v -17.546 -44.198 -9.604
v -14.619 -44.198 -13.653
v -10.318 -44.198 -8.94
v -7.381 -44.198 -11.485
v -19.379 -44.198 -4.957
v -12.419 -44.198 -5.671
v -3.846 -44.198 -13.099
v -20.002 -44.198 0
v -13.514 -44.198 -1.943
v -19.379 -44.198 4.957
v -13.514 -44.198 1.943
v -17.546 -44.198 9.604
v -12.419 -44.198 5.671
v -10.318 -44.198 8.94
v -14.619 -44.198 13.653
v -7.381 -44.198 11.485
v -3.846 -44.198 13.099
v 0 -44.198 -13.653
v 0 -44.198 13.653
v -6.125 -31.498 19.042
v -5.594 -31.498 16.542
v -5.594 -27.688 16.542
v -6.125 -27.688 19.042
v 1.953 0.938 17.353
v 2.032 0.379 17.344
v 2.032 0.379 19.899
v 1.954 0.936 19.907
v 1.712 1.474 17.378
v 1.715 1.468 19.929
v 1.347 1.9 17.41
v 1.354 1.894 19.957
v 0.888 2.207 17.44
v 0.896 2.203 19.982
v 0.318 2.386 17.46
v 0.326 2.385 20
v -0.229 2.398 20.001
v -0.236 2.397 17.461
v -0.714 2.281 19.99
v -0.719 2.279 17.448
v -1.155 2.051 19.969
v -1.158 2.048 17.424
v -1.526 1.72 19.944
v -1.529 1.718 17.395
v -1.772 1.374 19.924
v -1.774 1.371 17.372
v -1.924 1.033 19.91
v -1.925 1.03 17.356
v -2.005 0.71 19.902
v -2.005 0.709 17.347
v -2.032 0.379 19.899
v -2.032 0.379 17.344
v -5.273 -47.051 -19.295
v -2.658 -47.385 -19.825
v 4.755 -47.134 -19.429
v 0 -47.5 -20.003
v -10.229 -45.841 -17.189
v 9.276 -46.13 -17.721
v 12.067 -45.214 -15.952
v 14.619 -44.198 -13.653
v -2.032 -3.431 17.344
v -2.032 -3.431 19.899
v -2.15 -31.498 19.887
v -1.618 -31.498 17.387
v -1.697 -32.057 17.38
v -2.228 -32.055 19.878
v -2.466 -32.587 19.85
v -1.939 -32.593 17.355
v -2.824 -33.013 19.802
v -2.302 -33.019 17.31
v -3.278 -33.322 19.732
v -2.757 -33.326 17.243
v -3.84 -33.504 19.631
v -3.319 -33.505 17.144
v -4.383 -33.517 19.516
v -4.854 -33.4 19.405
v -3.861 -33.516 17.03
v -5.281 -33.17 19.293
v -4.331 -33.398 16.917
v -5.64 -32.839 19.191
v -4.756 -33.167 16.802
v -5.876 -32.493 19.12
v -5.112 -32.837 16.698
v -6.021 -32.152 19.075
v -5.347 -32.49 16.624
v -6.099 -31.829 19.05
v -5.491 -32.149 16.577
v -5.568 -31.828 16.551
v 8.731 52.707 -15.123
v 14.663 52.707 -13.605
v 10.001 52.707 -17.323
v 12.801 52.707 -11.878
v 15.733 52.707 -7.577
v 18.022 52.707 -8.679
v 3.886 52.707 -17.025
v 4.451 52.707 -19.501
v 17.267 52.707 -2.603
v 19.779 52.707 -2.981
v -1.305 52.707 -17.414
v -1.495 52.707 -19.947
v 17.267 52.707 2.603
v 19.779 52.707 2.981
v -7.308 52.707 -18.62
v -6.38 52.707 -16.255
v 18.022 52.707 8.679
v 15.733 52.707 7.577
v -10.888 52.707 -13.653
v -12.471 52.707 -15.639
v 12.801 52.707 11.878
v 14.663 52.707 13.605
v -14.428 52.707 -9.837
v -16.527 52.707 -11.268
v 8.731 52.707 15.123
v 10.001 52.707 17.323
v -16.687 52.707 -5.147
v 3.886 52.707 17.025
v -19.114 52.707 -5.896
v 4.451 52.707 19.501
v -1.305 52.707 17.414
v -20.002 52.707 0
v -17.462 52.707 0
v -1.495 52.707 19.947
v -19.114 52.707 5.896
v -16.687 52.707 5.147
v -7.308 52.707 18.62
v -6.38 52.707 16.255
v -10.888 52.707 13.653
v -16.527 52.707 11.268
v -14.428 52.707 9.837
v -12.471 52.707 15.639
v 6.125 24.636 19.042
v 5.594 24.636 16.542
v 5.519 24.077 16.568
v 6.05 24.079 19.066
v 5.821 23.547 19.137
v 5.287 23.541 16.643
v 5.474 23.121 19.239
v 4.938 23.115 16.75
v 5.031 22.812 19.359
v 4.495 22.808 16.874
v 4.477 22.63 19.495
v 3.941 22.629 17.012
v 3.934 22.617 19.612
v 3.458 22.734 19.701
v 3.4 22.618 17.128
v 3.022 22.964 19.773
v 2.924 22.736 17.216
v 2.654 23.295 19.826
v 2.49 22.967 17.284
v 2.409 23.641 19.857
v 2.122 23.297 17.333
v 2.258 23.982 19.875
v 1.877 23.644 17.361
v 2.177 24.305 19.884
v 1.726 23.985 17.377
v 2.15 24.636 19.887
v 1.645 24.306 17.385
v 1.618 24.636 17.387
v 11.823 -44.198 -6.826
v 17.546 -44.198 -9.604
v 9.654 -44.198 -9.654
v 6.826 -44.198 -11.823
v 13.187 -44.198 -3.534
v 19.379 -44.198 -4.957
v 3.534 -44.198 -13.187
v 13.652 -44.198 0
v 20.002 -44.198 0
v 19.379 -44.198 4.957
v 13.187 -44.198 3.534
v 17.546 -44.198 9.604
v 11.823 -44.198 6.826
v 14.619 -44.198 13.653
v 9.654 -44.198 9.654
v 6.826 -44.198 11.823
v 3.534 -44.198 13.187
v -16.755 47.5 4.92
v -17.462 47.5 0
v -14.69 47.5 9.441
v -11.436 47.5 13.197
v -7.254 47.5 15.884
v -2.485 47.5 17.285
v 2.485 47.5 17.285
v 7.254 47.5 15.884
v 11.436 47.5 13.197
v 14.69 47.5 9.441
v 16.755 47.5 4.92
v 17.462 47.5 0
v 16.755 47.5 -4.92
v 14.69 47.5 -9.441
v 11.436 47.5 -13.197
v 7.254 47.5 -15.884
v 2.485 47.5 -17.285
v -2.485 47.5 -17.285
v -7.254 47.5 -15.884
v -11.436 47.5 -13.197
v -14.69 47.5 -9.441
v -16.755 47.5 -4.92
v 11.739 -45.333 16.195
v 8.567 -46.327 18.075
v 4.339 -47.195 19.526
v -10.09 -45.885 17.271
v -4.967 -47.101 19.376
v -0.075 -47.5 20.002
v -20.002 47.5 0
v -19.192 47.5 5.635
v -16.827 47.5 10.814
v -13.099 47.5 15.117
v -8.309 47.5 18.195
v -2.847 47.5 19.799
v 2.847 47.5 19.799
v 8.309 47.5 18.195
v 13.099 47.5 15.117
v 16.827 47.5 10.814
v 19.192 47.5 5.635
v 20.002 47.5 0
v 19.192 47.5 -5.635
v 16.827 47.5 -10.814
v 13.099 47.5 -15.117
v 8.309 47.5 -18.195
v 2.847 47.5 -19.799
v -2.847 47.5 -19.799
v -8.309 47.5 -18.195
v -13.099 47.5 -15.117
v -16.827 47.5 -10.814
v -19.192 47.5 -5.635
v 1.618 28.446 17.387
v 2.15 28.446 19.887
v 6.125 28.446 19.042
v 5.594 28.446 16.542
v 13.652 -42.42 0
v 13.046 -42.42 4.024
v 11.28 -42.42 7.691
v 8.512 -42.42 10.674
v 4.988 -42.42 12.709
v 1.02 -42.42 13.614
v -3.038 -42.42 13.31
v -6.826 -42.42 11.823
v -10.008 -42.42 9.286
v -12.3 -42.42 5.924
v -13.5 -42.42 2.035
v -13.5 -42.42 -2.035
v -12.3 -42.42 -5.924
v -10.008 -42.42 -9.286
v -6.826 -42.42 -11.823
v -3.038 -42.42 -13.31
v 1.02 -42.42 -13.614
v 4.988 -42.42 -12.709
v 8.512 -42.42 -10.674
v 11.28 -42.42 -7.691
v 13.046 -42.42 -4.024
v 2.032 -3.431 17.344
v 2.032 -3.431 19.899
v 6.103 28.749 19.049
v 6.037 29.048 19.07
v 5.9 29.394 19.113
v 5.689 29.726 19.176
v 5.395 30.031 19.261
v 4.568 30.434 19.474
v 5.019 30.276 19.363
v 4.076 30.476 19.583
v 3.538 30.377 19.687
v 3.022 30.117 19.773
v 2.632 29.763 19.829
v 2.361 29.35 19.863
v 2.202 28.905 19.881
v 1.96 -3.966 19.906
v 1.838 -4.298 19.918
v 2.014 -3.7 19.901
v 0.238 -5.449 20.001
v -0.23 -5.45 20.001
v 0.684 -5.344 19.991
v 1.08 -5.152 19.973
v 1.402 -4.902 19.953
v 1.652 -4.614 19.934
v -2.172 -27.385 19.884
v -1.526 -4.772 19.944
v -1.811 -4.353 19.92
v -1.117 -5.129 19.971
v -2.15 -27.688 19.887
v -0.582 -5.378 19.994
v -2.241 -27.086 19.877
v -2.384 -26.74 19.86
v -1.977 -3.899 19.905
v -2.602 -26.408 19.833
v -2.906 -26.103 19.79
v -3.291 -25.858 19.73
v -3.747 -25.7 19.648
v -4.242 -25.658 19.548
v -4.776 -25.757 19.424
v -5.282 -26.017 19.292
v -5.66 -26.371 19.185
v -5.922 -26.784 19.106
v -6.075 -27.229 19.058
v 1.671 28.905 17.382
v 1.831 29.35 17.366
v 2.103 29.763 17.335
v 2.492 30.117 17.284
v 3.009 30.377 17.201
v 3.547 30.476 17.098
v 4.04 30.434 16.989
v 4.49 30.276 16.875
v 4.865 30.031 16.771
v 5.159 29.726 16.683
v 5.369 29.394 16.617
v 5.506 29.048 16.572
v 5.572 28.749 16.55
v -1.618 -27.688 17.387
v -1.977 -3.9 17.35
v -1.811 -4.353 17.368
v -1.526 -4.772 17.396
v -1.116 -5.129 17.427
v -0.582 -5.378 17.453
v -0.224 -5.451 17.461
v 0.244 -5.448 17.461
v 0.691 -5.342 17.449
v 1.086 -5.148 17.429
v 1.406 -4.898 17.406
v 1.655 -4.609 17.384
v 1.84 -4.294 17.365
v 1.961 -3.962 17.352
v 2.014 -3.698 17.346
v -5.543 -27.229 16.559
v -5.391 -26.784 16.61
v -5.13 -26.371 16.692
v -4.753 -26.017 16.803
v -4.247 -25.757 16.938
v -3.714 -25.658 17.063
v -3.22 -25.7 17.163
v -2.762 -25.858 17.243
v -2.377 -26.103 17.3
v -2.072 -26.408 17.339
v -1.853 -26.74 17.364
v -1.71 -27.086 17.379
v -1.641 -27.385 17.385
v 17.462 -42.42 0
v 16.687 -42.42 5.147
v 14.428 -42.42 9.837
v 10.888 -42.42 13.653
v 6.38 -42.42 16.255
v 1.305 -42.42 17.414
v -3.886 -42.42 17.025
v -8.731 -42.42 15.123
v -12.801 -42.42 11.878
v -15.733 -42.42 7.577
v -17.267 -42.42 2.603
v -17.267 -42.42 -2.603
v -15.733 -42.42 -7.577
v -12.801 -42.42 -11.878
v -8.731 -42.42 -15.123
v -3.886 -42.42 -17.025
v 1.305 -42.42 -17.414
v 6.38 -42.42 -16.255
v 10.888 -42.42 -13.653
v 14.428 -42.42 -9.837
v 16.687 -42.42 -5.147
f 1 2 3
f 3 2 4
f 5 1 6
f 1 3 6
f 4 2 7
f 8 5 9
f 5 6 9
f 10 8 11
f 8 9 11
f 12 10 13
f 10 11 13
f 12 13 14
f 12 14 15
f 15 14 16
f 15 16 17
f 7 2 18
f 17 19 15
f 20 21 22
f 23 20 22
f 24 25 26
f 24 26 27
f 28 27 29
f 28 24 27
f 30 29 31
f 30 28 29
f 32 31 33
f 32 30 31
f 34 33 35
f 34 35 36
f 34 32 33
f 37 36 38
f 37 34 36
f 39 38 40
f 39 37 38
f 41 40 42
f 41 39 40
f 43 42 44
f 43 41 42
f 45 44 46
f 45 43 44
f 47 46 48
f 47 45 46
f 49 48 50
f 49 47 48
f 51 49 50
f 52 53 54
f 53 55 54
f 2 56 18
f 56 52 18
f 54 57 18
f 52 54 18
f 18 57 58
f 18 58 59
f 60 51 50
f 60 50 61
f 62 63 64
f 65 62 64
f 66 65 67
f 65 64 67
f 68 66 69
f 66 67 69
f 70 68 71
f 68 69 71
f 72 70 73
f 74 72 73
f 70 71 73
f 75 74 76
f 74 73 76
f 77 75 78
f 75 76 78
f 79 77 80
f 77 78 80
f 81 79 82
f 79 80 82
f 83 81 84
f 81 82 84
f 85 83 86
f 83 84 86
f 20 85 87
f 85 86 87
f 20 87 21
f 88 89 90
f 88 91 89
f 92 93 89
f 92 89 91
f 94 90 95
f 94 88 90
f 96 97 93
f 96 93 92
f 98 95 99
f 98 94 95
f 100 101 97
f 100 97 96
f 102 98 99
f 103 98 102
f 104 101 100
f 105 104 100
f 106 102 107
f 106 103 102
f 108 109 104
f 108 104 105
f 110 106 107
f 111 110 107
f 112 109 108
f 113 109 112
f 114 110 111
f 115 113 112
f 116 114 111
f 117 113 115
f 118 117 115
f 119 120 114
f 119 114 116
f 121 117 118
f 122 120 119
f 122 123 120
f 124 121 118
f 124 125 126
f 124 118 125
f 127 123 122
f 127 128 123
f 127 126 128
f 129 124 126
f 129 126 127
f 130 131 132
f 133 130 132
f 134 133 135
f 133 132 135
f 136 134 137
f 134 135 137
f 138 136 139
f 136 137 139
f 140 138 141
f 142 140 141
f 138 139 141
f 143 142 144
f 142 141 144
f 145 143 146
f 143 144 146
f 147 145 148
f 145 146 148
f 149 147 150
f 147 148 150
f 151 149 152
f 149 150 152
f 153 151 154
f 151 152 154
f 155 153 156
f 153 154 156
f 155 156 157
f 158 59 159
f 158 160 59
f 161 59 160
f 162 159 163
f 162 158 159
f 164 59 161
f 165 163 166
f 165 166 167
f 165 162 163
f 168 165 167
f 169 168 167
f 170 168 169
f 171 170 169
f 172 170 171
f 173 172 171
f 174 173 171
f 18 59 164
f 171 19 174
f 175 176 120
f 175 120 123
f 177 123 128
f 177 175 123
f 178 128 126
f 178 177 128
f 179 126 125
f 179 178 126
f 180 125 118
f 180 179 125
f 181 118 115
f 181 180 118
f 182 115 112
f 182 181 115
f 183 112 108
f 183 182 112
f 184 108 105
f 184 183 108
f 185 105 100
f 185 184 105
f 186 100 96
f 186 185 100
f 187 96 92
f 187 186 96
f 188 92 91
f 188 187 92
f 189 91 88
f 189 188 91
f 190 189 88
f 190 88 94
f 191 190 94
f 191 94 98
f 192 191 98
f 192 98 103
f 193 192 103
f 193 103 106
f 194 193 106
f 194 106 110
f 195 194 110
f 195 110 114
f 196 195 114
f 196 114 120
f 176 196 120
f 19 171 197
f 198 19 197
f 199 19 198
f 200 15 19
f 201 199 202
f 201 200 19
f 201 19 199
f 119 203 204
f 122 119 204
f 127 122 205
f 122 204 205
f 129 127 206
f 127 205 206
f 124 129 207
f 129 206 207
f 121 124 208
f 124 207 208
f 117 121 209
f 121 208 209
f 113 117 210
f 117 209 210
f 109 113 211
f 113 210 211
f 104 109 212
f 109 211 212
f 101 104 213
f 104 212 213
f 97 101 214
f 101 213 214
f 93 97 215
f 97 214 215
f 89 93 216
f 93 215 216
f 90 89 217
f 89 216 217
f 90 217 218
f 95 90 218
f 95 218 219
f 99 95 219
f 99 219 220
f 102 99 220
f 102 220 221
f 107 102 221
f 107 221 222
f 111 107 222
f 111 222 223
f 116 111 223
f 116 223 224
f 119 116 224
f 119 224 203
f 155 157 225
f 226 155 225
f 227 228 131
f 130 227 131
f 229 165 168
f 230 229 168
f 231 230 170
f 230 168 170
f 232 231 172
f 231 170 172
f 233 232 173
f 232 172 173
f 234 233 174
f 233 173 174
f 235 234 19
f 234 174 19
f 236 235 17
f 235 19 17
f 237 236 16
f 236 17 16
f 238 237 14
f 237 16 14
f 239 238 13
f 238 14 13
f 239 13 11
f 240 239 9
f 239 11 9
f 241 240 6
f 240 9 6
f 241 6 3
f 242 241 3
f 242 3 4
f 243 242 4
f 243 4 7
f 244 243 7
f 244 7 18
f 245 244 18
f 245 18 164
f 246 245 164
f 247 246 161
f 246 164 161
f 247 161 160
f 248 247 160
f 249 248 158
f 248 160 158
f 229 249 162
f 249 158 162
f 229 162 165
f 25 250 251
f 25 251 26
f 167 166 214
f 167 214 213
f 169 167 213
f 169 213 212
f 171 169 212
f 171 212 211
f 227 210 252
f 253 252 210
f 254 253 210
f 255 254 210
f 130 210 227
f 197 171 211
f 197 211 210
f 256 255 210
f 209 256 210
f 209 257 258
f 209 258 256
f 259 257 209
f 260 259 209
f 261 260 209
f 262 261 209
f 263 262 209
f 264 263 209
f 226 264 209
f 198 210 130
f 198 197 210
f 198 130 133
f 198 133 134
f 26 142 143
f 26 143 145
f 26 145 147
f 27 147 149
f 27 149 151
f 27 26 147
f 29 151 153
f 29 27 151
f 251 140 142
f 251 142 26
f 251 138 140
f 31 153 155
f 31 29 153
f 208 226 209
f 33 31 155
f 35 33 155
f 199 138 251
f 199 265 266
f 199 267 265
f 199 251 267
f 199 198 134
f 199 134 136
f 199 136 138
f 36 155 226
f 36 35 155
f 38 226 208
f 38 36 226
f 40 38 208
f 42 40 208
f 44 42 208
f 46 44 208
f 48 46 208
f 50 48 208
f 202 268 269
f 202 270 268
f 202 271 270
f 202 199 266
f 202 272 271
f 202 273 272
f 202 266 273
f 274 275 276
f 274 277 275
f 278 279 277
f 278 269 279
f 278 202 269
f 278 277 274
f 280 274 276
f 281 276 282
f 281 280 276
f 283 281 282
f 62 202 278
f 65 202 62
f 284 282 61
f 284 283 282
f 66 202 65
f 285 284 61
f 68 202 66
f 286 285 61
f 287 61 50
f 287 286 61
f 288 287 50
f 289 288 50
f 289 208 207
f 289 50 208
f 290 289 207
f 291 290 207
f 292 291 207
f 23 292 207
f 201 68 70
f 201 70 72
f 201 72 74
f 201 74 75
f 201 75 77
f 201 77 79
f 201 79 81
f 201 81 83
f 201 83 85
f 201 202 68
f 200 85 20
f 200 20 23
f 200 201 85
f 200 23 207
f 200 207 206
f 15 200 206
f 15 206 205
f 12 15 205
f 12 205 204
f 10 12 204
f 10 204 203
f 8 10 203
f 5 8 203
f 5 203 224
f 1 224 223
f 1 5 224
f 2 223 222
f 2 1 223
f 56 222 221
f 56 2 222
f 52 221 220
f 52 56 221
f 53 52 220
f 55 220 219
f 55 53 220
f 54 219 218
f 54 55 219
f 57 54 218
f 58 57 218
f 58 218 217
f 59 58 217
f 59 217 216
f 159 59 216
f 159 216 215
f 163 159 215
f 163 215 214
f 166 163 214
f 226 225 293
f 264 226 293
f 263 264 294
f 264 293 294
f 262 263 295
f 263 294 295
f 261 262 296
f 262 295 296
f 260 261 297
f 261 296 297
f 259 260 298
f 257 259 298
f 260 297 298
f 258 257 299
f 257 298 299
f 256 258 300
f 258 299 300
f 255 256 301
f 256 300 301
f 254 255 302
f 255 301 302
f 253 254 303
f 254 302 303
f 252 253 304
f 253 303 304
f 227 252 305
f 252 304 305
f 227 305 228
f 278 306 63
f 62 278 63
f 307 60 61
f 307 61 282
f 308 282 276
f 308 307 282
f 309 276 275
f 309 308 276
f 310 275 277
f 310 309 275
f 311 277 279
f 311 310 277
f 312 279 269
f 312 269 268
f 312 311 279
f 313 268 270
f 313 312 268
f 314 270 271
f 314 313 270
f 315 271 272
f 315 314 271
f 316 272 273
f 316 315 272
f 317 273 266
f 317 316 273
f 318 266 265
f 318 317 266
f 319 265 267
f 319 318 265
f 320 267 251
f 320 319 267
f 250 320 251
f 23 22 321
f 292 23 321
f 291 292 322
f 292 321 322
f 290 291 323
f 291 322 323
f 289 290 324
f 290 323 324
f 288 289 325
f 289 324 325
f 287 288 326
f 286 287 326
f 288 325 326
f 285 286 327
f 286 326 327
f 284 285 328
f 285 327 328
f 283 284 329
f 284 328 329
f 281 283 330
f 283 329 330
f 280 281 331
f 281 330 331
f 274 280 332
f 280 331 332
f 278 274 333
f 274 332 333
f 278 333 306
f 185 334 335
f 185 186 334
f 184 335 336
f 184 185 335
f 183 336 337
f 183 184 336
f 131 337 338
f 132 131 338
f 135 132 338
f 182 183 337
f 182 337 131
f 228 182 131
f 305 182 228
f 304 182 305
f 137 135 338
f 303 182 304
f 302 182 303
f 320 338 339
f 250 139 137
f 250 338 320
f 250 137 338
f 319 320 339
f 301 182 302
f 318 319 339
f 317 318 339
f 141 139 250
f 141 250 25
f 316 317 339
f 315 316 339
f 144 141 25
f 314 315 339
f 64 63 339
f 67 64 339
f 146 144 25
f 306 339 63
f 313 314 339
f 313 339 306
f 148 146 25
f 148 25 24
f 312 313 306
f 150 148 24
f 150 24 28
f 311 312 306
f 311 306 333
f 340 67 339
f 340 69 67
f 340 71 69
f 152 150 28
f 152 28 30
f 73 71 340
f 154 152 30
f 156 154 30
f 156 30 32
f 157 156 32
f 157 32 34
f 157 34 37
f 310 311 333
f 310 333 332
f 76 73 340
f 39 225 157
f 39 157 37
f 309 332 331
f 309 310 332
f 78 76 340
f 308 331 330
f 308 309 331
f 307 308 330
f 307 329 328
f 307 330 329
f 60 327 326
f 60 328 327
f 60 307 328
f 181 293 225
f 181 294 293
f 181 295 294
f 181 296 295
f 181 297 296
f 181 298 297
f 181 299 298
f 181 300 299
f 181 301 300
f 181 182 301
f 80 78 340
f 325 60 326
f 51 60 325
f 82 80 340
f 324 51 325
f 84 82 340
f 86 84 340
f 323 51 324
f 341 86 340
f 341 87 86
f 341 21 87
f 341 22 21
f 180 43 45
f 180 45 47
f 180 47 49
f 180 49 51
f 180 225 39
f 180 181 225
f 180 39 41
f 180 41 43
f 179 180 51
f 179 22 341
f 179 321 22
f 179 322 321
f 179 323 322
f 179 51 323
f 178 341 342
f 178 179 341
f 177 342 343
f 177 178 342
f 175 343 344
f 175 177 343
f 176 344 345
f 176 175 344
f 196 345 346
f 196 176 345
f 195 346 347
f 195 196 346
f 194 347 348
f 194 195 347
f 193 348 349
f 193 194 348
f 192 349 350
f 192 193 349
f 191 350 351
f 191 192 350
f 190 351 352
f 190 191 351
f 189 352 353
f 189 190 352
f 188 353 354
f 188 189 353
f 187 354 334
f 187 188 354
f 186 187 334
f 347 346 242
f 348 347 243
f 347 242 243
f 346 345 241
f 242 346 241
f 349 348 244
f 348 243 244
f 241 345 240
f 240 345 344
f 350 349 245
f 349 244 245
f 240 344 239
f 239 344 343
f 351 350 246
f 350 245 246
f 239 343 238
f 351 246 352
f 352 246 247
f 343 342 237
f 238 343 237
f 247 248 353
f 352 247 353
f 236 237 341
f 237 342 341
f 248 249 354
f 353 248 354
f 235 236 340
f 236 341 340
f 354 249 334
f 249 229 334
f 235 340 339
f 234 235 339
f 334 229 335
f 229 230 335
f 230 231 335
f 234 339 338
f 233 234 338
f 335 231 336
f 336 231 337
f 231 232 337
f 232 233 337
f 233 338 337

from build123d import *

# Parameters (mm, degrees)
F0_R          = 20.0025
F0_R_2        = 17.4625
F1_DEPTH      = 47.5
F2_R          = 20.0025
F2_R_2        = 13.6525
F3_DEPTH      = 5.08
F5_DEPTH      = 20.0035
F5_DEPTH_BACK = 20.0035
F7_DEPTH      = 20.0035001
F11_DEPTH     = 23.7251510989
F14_DEPTH     = 23.7251510989
F15_R         = 20.0025
F15_R_2       = 17.4625
F16_DEPTH     = 5.207


with BuildPart() as f1:
    # F0 (on Front) → F1 (new body, symmetric)
    with BuildSketch(Plane.XZ):
        Circle(F0_R)
        Circle(F0_R_2, mode=Mode.SUBTRACT)
    extrude(amount=F1_DEPTH, both=True)

    # F2 (on face) → F3 (join)
    with BuildSketch(Plane.XZ.offset(47.5)):
        Circle(F2_R)
        Circle(F2_R_2, mode=Mode.SUBTRACT)
    extrude(amount=-F3_DEPTH)

    # F4 (on Right) → F5 (cut, two sides)
    with BuildSketch(Plane.YZ) as f5_sk:
        with BuildLine():
            Line((-44.198, -13.6525), (-44.198, 13.6525))
            ThreePointArc((-44.198, 13.6525), (-45.6936183213, 16.9082984729), (-47.5, 20.0025))
            Line((-47.5, 20.0025), (-47.5, -20.0025))
            ThreePointArc((-47.5, -20.0025), (-45.6936183213, -16.9082984729), (-44.198, -13.6525))
        make_face()
    extrude(amount=-F5_DEPTH, mode=Mode.SUBTRACT)
    extrude(f5_sk.sketch, amount=F5_DEPTH_BACK, mode=Mode.SUBTRACT)

    # F6 (on Top) → F7 (cut, through all)
    with BuildSketch(Plane.XY):
        with BuildLine():
            Line((-2.032, 0.379), (-2.032, -3.431))
            ThreePointArc((-2.032, -3.431), (0, -5.463), (2.032, -3.431))
            Line((2.032, -3.431), (2.032, 0.379))
            ThreePointArc((2.032, 0.379), (0, 2.411), (-2.032, 0.379))
        make_face()
    extrude(amount=F7_DEPTH, mode=Mode.SUBTRACT)

    # F10 (on face) → F11 (cut, through all)
    with BuildSketch(Plane(origin=(0, 0, 0), x_dir=(0.9781476007, 0, 0.2079116908), z_dir=(0.2079116908, 0, -0.9781476007))):
        with BuildLine():
            ThreePointArc((2.032, 31.498), (0, 33.53), (-2.032, 31.498))
            Line((-2.032, 31.498), (-2.032, 27.688))
            ThreePointArc((-2.032, 27.688), (0, 25.656), (2.032, 27.688))
            Line((2.032, 27.688), (2.032, 31.498))
        make_face()
    extrude(amount=-F11_DEPTH, mode=Mode.SUBTRACT)

    # F13 (on face) → F14 (cut, through all)
    with BuildSketch(Plane(origin=(0, 0, 0), x_dir=(0.9781476007, 0, -0.2079116908), z_dir=(-0.2079116908, 0, -0.9781476007))):
        with BuildLine():
            Line((2.032, -28.446), (2.032, -24.636))
            ThreePointArc((2.032, -24.636), (0, -22.604), (-2.032, -24.636))
            Line((-2.032, -24.636), (-2.032, -28.446))
            ThreePointArc((-2.032, -28.446), (0, -30.478), (2.032, -28.446))
        make_face()
    extrude(amount=-F14_DEPTH, mode=Mode.SUBTRACT)

    # F15 (on face) → F16 (join)
    with BuildSketch(Plane(origin=(0, 47.5, 0), x_dir=(-1, 0, 0), z_dir=(0, 1, 0))):
        Circle(F15_R)
        Circle(F15_R_2, mode=Mode.SUBTRACT)
    extrude(amount=F16_DEPTH)


solid = f1.part
